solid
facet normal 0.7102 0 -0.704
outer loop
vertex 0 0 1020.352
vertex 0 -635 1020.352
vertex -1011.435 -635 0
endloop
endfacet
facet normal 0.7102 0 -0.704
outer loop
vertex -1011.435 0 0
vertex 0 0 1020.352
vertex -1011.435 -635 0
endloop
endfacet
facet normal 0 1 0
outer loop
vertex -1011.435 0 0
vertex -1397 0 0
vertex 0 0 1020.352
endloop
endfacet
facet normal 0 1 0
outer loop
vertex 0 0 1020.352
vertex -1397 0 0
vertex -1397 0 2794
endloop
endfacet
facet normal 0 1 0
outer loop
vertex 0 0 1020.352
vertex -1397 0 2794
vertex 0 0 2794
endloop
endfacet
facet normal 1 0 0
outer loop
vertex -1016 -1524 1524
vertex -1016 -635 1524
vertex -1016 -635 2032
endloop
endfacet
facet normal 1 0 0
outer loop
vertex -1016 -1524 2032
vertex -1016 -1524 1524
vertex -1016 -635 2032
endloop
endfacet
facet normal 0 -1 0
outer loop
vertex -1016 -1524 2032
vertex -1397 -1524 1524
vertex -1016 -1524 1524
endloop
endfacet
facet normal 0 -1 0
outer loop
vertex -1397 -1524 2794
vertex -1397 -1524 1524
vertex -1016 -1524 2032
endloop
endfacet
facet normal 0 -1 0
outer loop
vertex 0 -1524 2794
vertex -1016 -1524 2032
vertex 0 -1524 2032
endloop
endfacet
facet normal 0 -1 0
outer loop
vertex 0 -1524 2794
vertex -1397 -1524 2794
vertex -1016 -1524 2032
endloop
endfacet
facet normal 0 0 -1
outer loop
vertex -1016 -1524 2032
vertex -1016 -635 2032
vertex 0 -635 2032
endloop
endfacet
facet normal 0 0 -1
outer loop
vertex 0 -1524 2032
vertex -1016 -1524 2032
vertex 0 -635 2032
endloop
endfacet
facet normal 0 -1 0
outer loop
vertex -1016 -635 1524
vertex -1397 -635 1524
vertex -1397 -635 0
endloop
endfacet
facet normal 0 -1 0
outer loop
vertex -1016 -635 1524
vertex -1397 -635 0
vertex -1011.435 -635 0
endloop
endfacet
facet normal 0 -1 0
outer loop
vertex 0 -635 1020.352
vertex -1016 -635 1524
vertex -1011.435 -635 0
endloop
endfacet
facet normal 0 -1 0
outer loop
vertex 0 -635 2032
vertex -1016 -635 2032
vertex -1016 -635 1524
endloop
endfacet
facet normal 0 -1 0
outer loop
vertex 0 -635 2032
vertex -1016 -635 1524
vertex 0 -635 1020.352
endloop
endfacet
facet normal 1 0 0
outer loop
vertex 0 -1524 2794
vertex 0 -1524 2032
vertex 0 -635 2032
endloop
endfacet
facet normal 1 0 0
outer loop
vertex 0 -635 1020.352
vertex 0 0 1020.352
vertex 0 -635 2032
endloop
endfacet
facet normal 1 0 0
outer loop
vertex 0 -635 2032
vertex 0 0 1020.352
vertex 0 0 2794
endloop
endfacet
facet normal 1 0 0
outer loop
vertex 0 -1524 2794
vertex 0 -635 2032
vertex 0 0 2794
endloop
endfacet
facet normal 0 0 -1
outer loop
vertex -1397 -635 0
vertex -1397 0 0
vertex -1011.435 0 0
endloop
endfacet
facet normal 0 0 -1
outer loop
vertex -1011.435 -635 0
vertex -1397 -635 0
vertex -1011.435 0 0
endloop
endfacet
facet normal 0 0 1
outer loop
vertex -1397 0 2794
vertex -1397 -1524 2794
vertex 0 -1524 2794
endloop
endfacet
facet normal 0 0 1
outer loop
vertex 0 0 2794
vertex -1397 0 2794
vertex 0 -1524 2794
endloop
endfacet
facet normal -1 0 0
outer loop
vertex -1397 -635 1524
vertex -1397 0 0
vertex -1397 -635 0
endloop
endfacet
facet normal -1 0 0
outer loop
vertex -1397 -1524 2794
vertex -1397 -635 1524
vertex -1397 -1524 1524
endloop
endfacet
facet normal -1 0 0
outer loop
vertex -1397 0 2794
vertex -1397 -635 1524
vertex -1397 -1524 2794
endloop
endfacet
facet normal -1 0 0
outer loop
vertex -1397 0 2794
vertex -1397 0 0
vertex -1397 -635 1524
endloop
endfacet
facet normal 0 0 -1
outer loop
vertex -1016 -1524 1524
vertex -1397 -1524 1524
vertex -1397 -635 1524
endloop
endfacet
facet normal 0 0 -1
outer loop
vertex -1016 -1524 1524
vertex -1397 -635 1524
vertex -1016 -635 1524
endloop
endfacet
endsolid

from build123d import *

# Parameters (mm, degrees)
F0_W     = 1397
F0_H     = 2794
F1_DEPTH = 635
F2_W     = 1016
F2_H     = 762
F3_DEPTH = 889
F4_W     = 381
F4_H     = 1270
F5_DEPTH = 889
F8_DEPTH = 949.96


with BuildPart() as f1:
    # F0 (on Front) → F1 (new body)
    with BuildSketch(Plane.XZ):
        with Locations((-698.5, 1397)):
            Rectangle(F0_W, F0_H)
    extrude(amount=F1_DEPTH)

    # F2 (on face) → F3 (join)
    with BuildSketch(Plane.XZ.offset(635)):
        with Locations((-508, 2413)):
            Rectangle(F2_W, F2_H)
    extrude(amount=F3_DEPTH)

    # F4 (on face) → F5 (join)
    with BuildSketch(Plane.XZ.offset(635)):
        with Locations((-1206.5, 2159)):
            Rectangle(F4_W, F4_H)
    extrude(amount=F5_DEPTH)

    # F7 (on face) → F8 (cut)
    with BuildSketch(Plane.XZ.offset(635)):
        Polygon((0, 1020.3515291214), (-1011.4349126816, 0), (0, 0), align=None)
    extrude(amount=-F8_DEPTH, mode=Mode.SUBTRACT)


solid = f1.part
